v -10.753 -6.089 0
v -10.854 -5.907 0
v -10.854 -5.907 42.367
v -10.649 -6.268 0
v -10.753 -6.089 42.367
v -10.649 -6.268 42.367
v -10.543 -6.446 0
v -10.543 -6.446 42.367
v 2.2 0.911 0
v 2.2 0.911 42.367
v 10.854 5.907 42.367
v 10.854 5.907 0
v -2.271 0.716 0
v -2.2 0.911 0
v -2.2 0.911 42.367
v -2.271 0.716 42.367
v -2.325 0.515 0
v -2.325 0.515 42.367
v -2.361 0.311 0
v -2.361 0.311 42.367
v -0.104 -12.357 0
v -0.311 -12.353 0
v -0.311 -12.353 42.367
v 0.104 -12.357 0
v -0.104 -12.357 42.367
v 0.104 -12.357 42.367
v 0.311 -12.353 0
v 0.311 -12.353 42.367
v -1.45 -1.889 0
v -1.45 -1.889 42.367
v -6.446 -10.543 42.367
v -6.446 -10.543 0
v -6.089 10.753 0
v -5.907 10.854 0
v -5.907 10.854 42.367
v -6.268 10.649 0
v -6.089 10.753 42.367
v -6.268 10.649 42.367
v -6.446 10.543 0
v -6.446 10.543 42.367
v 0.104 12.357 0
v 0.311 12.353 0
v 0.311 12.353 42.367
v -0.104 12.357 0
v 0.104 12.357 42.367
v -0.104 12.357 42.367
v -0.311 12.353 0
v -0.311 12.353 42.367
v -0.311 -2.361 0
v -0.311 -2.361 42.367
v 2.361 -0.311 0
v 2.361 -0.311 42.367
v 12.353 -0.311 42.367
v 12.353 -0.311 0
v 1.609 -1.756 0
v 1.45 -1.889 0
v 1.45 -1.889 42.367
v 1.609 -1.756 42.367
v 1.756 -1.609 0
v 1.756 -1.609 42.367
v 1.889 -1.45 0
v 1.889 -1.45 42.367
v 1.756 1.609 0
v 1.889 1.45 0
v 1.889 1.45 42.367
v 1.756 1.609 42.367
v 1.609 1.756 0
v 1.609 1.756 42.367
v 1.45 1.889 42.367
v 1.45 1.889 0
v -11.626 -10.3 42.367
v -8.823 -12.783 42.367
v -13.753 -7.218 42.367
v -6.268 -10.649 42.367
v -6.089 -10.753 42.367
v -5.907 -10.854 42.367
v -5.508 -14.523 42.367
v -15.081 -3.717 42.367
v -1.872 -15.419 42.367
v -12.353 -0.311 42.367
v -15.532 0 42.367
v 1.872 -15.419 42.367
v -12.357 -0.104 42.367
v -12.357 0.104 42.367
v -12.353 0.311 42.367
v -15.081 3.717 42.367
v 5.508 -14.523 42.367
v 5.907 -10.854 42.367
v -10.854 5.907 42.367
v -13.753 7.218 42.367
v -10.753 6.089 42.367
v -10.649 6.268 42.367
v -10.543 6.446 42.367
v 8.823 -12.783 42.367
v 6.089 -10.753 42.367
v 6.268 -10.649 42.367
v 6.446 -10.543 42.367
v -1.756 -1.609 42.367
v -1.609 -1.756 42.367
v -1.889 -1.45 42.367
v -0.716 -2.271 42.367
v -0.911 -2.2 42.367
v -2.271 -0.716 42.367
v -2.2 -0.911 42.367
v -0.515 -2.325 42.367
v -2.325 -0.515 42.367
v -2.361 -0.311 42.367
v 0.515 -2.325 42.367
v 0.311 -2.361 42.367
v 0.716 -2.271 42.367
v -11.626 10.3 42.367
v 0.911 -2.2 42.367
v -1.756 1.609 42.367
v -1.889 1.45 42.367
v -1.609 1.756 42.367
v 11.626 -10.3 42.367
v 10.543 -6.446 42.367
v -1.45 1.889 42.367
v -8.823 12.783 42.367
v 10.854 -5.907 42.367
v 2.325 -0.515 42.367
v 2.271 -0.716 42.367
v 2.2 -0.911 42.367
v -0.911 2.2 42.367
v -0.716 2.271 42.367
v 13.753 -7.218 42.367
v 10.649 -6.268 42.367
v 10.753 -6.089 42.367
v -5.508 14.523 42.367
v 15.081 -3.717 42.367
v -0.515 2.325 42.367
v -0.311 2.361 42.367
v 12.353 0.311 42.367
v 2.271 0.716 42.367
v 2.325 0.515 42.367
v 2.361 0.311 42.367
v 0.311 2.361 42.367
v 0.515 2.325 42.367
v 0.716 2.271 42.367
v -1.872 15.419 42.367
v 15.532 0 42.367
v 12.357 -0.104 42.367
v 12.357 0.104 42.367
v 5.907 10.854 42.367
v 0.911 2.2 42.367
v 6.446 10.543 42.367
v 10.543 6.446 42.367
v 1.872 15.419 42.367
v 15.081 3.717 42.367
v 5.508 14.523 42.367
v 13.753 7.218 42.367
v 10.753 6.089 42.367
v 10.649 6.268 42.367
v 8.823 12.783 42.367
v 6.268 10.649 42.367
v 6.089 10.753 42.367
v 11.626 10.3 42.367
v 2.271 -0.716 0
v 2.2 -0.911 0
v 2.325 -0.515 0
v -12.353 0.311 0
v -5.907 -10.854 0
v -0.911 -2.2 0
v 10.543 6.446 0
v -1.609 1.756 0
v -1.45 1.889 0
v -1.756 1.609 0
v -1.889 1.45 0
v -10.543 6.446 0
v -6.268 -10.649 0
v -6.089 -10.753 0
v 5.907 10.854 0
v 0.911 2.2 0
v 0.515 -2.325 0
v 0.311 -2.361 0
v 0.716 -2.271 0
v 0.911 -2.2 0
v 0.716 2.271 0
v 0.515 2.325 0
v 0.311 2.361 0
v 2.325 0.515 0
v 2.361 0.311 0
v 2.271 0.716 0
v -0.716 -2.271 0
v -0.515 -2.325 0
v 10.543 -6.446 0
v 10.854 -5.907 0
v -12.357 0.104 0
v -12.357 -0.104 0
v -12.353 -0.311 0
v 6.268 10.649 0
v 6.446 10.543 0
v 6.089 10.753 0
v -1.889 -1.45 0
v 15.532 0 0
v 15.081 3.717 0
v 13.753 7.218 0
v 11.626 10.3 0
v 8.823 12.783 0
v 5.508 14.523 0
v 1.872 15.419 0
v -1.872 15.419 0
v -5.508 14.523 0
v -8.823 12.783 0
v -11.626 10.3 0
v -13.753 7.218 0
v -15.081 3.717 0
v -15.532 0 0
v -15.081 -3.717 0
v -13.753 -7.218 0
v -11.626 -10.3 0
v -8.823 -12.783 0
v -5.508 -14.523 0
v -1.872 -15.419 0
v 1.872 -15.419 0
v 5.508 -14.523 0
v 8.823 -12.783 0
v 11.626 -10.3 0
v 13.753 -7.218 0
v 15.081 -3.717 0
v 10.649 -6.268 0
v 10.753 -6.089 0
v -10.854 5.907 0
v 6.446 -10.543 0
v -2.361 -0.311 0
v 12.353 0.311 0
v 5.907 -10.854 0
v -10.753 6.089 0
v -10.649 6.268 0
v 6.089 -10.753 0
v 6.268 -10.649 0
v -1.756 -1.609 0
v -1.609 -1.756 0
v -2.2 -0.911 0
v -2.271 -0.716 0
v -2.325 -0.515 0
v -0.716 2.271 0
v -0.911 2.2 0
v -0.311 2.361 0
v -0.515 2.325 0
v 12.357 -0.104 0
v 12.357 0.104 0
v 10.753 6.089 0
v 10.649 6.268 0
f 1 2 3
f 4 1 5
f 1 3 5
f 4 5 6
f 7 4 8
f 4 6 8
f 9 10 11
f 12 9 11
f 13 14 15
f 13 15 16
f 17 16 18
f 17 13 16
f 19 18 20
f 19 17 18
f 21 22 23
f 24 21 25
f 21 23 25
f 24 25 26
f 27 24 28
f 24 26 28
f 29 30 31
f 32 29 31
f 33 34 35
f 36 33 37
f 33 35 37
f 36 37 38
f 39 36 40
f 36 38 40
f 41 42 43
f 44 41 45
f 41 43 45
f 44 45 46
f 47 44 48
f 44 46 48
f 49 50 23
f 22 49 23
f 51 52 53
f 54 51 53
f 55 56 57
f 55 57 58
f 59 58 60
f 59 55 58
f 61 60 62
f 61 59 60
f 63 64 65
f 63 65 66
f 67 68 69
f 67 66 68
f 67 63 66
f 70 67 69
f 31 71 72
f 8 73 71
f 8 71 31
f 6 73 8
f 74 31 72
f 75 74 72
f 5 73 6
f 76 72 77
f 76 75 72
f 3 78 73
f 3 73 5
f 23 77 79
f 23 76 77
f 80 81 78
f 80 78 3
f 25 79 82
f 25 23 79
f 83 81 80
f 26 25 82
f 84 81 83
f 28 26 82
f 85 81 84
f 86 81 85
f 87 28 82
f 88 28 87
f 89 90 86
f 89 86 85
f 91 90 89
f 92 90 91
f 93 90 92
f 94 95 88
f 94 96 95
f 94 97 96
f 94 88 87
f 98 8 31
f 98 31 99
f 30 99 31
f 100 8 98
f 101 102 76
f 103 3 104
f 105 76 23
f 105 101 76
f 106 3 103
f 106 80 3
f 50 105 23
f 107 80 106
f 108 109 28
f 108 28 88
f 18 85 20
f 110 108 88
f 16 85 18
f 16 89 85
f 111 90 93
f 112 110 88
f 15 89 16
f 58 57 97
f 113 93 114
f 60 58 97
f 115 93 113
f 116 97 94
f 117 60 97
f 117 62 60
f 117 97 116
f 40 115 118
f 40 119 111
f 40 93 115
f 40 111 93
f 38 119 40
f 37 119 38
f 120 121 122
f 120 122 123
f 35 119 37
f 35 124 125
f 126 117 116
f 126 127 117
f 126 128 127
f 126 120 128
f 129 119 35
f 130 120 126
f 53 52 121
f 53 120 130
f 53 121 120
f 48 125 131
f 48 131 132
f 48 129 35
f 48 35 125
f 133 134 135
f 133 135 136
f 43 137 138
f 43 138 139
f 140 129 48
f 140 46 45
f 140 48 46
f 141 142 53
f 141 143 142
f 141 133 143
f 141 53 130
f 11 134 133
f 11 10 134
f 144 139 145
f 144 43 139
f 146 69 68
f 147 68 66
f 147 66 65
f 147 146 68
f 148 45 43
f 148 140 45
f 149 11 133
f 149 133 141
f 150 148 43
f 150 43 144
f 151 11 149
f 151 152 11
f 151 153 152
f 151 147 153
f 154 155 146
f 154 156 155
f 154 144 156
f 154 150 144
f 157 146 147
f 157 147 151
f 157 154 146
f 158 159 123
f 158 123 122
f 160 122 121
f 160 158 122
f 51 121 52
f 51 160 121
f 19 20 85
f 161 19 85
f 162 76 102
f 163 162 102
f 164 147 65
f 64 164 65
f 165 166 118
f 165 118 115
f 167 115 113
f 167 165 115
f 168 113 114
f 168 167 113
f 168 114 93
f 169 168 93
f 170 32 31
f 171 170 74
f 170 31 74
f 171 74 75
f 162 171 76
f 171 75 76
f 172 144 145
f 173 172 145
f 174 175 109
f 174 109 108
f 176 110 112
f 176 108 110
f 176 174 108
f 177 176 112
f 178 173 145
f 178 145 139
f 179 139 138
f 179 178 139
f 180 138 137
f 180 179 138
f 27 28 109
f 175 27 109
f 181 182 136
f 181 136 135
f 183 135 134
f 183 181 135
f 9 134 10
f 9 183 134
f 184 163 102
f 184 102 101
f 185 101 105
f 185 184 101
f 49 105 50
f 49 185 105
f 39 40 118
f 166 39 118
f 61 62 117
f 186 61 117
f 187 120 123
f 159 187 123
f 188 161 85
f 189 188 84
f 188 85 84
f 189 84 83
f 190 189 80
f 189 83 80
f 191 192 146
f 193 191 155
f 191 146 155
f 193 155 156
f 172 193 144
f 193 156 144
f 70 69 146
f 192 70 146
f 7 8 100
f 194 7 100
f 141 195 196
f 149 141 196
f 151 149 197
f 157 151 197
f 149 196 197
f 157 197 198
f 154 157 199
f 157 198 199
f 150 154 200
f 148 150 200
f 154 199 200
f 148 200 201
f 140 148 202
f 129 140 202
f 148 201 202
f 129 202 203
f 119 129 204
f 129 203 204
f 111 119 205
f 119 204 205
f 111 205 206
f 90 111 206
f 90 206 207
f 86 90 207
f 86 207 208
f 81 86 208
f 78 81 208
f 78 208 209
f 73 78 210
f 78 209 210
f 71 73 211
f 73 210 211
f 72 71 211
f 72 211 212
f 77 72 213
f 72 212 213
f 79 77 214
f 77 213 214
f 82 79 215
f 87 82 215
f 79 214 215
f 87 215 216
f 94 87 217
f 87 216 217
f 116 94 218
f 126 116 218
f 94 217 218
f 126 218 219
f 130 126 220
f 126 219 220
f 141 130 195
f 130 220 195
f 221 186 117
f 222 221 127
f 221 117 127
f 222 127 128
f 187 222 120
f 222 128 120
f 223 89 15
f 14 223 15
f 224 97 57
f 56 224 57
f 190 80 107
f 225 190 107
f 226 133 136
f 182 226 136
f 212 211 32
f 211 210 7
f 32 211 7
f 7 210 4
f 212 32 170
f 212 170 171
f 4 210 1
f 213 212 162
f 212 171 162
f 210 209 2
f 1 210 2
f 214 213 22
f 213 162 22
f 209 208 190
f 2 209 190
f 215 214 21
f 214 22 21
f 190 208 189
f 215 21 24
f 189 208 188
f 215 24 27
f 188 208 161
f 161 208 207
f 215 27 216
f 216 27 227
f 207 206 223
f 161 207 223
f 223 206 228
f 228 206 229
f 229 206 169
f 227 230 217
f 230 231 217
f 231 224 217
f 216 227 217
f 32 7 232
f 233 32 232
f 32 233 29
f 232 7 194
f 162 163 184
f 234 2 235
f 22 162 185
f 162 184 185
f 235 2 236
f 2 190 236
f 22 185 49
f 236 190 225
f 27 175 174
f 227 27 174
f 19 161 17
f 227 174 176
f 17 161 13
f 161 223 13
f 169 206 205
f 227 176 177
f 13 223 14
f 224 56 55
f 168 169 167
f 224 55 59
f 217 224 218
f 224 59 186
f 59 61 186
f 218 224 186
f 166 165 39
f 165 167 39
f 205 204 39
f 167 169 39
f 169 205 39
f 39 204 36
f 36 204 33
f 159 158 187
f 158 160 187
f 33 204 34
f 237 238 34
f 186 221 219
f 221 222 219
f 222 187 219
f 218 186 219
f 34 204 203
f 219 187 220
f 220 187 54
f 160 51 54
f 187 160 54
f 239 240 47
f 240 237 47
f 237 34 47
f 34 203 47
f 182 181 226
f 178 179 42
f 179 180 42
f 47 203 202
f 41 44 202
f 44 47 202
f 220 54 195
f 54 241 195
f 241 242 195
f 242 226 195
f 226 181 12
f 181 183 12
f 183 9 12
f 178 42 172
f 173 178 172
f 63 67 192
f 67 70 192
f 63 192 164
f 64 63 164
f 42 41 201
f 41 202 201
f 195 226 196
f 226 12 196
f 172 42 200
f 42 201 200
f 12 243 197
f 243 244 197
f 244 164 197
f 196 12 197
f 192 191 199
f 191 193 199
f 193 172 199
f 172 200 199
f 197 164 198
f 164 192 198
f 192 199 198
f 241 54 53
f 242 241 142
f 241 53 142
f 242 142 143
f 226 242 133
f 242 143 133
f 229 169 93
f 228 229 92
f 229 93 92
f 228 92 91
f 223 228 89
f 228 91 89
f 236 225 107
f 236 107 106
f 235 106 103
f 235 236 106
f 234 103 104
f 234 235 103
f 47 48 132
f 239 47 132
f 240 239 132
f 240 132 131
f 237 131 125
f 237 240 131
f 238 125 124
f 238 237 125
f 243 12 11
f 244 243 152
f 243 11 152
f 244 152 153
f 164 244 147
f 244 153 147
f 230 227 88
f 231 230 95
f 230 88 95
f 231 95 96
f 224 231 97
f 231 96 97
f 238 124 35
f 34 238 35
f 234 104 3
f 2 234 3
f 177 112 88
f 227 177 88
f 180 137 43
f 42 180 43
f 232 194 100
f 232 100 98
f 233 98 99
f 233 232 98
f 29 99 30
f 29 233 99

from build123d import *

# Parameters (mm, degrees)
F0_R     = 15.5321
F0_R_2   = 2.38125
F1_DEPTH = 42.3672
F3_DEPTH = 42.3672
F4_COUNT = 12
F4_ANGLE = 330


with BuildPart() as f1:
    # F0 (on Top) → F1 (new body)
    with BuildSketch(Plane.XY):
        Circle(F0_R)
        Circle(F0_R_2, mode=Mode.SUBTRACT)
    extrude(amount=F1_DEPTH)

    # F2 (on face) → F3 (cut, through all)
    with BuildSketch(Plane.XY.offset(42.3672)):
        with BuildLine():
            Line((-0.3108154952, 12.3531904437), (-0.3108154952, 2.3608780761))
            Line((-0.3108154952, 2.3608780761), (0, 2.3608780761))
            Line((0, 2.3608780761), (0.3108154952, 2.3608780761))
            Line((0.3108154952, 2.3608780761), (0.3108154952, 12.3531904437))
            ThreePointArc((0.3108154952, 12.3531904437), (0, 12.3571), (-0.3108154952, 12.3531904437))
        make_face()
    f3 = extrude(amount=-F3_DEPTH, mode=Mode.SUBTRACT)

    # F4: F3 ×12 about axis
    f4_axis = Axis((0, 0, 0), (0, 0, 1))
    for i in range(1, F4_COUNT):
        add(f3.rotate(f4_axis, i * F4_ANGLE / (F4_COUNT - 1)), mode=Mode.SUBTRACT)


solid = f1.part
